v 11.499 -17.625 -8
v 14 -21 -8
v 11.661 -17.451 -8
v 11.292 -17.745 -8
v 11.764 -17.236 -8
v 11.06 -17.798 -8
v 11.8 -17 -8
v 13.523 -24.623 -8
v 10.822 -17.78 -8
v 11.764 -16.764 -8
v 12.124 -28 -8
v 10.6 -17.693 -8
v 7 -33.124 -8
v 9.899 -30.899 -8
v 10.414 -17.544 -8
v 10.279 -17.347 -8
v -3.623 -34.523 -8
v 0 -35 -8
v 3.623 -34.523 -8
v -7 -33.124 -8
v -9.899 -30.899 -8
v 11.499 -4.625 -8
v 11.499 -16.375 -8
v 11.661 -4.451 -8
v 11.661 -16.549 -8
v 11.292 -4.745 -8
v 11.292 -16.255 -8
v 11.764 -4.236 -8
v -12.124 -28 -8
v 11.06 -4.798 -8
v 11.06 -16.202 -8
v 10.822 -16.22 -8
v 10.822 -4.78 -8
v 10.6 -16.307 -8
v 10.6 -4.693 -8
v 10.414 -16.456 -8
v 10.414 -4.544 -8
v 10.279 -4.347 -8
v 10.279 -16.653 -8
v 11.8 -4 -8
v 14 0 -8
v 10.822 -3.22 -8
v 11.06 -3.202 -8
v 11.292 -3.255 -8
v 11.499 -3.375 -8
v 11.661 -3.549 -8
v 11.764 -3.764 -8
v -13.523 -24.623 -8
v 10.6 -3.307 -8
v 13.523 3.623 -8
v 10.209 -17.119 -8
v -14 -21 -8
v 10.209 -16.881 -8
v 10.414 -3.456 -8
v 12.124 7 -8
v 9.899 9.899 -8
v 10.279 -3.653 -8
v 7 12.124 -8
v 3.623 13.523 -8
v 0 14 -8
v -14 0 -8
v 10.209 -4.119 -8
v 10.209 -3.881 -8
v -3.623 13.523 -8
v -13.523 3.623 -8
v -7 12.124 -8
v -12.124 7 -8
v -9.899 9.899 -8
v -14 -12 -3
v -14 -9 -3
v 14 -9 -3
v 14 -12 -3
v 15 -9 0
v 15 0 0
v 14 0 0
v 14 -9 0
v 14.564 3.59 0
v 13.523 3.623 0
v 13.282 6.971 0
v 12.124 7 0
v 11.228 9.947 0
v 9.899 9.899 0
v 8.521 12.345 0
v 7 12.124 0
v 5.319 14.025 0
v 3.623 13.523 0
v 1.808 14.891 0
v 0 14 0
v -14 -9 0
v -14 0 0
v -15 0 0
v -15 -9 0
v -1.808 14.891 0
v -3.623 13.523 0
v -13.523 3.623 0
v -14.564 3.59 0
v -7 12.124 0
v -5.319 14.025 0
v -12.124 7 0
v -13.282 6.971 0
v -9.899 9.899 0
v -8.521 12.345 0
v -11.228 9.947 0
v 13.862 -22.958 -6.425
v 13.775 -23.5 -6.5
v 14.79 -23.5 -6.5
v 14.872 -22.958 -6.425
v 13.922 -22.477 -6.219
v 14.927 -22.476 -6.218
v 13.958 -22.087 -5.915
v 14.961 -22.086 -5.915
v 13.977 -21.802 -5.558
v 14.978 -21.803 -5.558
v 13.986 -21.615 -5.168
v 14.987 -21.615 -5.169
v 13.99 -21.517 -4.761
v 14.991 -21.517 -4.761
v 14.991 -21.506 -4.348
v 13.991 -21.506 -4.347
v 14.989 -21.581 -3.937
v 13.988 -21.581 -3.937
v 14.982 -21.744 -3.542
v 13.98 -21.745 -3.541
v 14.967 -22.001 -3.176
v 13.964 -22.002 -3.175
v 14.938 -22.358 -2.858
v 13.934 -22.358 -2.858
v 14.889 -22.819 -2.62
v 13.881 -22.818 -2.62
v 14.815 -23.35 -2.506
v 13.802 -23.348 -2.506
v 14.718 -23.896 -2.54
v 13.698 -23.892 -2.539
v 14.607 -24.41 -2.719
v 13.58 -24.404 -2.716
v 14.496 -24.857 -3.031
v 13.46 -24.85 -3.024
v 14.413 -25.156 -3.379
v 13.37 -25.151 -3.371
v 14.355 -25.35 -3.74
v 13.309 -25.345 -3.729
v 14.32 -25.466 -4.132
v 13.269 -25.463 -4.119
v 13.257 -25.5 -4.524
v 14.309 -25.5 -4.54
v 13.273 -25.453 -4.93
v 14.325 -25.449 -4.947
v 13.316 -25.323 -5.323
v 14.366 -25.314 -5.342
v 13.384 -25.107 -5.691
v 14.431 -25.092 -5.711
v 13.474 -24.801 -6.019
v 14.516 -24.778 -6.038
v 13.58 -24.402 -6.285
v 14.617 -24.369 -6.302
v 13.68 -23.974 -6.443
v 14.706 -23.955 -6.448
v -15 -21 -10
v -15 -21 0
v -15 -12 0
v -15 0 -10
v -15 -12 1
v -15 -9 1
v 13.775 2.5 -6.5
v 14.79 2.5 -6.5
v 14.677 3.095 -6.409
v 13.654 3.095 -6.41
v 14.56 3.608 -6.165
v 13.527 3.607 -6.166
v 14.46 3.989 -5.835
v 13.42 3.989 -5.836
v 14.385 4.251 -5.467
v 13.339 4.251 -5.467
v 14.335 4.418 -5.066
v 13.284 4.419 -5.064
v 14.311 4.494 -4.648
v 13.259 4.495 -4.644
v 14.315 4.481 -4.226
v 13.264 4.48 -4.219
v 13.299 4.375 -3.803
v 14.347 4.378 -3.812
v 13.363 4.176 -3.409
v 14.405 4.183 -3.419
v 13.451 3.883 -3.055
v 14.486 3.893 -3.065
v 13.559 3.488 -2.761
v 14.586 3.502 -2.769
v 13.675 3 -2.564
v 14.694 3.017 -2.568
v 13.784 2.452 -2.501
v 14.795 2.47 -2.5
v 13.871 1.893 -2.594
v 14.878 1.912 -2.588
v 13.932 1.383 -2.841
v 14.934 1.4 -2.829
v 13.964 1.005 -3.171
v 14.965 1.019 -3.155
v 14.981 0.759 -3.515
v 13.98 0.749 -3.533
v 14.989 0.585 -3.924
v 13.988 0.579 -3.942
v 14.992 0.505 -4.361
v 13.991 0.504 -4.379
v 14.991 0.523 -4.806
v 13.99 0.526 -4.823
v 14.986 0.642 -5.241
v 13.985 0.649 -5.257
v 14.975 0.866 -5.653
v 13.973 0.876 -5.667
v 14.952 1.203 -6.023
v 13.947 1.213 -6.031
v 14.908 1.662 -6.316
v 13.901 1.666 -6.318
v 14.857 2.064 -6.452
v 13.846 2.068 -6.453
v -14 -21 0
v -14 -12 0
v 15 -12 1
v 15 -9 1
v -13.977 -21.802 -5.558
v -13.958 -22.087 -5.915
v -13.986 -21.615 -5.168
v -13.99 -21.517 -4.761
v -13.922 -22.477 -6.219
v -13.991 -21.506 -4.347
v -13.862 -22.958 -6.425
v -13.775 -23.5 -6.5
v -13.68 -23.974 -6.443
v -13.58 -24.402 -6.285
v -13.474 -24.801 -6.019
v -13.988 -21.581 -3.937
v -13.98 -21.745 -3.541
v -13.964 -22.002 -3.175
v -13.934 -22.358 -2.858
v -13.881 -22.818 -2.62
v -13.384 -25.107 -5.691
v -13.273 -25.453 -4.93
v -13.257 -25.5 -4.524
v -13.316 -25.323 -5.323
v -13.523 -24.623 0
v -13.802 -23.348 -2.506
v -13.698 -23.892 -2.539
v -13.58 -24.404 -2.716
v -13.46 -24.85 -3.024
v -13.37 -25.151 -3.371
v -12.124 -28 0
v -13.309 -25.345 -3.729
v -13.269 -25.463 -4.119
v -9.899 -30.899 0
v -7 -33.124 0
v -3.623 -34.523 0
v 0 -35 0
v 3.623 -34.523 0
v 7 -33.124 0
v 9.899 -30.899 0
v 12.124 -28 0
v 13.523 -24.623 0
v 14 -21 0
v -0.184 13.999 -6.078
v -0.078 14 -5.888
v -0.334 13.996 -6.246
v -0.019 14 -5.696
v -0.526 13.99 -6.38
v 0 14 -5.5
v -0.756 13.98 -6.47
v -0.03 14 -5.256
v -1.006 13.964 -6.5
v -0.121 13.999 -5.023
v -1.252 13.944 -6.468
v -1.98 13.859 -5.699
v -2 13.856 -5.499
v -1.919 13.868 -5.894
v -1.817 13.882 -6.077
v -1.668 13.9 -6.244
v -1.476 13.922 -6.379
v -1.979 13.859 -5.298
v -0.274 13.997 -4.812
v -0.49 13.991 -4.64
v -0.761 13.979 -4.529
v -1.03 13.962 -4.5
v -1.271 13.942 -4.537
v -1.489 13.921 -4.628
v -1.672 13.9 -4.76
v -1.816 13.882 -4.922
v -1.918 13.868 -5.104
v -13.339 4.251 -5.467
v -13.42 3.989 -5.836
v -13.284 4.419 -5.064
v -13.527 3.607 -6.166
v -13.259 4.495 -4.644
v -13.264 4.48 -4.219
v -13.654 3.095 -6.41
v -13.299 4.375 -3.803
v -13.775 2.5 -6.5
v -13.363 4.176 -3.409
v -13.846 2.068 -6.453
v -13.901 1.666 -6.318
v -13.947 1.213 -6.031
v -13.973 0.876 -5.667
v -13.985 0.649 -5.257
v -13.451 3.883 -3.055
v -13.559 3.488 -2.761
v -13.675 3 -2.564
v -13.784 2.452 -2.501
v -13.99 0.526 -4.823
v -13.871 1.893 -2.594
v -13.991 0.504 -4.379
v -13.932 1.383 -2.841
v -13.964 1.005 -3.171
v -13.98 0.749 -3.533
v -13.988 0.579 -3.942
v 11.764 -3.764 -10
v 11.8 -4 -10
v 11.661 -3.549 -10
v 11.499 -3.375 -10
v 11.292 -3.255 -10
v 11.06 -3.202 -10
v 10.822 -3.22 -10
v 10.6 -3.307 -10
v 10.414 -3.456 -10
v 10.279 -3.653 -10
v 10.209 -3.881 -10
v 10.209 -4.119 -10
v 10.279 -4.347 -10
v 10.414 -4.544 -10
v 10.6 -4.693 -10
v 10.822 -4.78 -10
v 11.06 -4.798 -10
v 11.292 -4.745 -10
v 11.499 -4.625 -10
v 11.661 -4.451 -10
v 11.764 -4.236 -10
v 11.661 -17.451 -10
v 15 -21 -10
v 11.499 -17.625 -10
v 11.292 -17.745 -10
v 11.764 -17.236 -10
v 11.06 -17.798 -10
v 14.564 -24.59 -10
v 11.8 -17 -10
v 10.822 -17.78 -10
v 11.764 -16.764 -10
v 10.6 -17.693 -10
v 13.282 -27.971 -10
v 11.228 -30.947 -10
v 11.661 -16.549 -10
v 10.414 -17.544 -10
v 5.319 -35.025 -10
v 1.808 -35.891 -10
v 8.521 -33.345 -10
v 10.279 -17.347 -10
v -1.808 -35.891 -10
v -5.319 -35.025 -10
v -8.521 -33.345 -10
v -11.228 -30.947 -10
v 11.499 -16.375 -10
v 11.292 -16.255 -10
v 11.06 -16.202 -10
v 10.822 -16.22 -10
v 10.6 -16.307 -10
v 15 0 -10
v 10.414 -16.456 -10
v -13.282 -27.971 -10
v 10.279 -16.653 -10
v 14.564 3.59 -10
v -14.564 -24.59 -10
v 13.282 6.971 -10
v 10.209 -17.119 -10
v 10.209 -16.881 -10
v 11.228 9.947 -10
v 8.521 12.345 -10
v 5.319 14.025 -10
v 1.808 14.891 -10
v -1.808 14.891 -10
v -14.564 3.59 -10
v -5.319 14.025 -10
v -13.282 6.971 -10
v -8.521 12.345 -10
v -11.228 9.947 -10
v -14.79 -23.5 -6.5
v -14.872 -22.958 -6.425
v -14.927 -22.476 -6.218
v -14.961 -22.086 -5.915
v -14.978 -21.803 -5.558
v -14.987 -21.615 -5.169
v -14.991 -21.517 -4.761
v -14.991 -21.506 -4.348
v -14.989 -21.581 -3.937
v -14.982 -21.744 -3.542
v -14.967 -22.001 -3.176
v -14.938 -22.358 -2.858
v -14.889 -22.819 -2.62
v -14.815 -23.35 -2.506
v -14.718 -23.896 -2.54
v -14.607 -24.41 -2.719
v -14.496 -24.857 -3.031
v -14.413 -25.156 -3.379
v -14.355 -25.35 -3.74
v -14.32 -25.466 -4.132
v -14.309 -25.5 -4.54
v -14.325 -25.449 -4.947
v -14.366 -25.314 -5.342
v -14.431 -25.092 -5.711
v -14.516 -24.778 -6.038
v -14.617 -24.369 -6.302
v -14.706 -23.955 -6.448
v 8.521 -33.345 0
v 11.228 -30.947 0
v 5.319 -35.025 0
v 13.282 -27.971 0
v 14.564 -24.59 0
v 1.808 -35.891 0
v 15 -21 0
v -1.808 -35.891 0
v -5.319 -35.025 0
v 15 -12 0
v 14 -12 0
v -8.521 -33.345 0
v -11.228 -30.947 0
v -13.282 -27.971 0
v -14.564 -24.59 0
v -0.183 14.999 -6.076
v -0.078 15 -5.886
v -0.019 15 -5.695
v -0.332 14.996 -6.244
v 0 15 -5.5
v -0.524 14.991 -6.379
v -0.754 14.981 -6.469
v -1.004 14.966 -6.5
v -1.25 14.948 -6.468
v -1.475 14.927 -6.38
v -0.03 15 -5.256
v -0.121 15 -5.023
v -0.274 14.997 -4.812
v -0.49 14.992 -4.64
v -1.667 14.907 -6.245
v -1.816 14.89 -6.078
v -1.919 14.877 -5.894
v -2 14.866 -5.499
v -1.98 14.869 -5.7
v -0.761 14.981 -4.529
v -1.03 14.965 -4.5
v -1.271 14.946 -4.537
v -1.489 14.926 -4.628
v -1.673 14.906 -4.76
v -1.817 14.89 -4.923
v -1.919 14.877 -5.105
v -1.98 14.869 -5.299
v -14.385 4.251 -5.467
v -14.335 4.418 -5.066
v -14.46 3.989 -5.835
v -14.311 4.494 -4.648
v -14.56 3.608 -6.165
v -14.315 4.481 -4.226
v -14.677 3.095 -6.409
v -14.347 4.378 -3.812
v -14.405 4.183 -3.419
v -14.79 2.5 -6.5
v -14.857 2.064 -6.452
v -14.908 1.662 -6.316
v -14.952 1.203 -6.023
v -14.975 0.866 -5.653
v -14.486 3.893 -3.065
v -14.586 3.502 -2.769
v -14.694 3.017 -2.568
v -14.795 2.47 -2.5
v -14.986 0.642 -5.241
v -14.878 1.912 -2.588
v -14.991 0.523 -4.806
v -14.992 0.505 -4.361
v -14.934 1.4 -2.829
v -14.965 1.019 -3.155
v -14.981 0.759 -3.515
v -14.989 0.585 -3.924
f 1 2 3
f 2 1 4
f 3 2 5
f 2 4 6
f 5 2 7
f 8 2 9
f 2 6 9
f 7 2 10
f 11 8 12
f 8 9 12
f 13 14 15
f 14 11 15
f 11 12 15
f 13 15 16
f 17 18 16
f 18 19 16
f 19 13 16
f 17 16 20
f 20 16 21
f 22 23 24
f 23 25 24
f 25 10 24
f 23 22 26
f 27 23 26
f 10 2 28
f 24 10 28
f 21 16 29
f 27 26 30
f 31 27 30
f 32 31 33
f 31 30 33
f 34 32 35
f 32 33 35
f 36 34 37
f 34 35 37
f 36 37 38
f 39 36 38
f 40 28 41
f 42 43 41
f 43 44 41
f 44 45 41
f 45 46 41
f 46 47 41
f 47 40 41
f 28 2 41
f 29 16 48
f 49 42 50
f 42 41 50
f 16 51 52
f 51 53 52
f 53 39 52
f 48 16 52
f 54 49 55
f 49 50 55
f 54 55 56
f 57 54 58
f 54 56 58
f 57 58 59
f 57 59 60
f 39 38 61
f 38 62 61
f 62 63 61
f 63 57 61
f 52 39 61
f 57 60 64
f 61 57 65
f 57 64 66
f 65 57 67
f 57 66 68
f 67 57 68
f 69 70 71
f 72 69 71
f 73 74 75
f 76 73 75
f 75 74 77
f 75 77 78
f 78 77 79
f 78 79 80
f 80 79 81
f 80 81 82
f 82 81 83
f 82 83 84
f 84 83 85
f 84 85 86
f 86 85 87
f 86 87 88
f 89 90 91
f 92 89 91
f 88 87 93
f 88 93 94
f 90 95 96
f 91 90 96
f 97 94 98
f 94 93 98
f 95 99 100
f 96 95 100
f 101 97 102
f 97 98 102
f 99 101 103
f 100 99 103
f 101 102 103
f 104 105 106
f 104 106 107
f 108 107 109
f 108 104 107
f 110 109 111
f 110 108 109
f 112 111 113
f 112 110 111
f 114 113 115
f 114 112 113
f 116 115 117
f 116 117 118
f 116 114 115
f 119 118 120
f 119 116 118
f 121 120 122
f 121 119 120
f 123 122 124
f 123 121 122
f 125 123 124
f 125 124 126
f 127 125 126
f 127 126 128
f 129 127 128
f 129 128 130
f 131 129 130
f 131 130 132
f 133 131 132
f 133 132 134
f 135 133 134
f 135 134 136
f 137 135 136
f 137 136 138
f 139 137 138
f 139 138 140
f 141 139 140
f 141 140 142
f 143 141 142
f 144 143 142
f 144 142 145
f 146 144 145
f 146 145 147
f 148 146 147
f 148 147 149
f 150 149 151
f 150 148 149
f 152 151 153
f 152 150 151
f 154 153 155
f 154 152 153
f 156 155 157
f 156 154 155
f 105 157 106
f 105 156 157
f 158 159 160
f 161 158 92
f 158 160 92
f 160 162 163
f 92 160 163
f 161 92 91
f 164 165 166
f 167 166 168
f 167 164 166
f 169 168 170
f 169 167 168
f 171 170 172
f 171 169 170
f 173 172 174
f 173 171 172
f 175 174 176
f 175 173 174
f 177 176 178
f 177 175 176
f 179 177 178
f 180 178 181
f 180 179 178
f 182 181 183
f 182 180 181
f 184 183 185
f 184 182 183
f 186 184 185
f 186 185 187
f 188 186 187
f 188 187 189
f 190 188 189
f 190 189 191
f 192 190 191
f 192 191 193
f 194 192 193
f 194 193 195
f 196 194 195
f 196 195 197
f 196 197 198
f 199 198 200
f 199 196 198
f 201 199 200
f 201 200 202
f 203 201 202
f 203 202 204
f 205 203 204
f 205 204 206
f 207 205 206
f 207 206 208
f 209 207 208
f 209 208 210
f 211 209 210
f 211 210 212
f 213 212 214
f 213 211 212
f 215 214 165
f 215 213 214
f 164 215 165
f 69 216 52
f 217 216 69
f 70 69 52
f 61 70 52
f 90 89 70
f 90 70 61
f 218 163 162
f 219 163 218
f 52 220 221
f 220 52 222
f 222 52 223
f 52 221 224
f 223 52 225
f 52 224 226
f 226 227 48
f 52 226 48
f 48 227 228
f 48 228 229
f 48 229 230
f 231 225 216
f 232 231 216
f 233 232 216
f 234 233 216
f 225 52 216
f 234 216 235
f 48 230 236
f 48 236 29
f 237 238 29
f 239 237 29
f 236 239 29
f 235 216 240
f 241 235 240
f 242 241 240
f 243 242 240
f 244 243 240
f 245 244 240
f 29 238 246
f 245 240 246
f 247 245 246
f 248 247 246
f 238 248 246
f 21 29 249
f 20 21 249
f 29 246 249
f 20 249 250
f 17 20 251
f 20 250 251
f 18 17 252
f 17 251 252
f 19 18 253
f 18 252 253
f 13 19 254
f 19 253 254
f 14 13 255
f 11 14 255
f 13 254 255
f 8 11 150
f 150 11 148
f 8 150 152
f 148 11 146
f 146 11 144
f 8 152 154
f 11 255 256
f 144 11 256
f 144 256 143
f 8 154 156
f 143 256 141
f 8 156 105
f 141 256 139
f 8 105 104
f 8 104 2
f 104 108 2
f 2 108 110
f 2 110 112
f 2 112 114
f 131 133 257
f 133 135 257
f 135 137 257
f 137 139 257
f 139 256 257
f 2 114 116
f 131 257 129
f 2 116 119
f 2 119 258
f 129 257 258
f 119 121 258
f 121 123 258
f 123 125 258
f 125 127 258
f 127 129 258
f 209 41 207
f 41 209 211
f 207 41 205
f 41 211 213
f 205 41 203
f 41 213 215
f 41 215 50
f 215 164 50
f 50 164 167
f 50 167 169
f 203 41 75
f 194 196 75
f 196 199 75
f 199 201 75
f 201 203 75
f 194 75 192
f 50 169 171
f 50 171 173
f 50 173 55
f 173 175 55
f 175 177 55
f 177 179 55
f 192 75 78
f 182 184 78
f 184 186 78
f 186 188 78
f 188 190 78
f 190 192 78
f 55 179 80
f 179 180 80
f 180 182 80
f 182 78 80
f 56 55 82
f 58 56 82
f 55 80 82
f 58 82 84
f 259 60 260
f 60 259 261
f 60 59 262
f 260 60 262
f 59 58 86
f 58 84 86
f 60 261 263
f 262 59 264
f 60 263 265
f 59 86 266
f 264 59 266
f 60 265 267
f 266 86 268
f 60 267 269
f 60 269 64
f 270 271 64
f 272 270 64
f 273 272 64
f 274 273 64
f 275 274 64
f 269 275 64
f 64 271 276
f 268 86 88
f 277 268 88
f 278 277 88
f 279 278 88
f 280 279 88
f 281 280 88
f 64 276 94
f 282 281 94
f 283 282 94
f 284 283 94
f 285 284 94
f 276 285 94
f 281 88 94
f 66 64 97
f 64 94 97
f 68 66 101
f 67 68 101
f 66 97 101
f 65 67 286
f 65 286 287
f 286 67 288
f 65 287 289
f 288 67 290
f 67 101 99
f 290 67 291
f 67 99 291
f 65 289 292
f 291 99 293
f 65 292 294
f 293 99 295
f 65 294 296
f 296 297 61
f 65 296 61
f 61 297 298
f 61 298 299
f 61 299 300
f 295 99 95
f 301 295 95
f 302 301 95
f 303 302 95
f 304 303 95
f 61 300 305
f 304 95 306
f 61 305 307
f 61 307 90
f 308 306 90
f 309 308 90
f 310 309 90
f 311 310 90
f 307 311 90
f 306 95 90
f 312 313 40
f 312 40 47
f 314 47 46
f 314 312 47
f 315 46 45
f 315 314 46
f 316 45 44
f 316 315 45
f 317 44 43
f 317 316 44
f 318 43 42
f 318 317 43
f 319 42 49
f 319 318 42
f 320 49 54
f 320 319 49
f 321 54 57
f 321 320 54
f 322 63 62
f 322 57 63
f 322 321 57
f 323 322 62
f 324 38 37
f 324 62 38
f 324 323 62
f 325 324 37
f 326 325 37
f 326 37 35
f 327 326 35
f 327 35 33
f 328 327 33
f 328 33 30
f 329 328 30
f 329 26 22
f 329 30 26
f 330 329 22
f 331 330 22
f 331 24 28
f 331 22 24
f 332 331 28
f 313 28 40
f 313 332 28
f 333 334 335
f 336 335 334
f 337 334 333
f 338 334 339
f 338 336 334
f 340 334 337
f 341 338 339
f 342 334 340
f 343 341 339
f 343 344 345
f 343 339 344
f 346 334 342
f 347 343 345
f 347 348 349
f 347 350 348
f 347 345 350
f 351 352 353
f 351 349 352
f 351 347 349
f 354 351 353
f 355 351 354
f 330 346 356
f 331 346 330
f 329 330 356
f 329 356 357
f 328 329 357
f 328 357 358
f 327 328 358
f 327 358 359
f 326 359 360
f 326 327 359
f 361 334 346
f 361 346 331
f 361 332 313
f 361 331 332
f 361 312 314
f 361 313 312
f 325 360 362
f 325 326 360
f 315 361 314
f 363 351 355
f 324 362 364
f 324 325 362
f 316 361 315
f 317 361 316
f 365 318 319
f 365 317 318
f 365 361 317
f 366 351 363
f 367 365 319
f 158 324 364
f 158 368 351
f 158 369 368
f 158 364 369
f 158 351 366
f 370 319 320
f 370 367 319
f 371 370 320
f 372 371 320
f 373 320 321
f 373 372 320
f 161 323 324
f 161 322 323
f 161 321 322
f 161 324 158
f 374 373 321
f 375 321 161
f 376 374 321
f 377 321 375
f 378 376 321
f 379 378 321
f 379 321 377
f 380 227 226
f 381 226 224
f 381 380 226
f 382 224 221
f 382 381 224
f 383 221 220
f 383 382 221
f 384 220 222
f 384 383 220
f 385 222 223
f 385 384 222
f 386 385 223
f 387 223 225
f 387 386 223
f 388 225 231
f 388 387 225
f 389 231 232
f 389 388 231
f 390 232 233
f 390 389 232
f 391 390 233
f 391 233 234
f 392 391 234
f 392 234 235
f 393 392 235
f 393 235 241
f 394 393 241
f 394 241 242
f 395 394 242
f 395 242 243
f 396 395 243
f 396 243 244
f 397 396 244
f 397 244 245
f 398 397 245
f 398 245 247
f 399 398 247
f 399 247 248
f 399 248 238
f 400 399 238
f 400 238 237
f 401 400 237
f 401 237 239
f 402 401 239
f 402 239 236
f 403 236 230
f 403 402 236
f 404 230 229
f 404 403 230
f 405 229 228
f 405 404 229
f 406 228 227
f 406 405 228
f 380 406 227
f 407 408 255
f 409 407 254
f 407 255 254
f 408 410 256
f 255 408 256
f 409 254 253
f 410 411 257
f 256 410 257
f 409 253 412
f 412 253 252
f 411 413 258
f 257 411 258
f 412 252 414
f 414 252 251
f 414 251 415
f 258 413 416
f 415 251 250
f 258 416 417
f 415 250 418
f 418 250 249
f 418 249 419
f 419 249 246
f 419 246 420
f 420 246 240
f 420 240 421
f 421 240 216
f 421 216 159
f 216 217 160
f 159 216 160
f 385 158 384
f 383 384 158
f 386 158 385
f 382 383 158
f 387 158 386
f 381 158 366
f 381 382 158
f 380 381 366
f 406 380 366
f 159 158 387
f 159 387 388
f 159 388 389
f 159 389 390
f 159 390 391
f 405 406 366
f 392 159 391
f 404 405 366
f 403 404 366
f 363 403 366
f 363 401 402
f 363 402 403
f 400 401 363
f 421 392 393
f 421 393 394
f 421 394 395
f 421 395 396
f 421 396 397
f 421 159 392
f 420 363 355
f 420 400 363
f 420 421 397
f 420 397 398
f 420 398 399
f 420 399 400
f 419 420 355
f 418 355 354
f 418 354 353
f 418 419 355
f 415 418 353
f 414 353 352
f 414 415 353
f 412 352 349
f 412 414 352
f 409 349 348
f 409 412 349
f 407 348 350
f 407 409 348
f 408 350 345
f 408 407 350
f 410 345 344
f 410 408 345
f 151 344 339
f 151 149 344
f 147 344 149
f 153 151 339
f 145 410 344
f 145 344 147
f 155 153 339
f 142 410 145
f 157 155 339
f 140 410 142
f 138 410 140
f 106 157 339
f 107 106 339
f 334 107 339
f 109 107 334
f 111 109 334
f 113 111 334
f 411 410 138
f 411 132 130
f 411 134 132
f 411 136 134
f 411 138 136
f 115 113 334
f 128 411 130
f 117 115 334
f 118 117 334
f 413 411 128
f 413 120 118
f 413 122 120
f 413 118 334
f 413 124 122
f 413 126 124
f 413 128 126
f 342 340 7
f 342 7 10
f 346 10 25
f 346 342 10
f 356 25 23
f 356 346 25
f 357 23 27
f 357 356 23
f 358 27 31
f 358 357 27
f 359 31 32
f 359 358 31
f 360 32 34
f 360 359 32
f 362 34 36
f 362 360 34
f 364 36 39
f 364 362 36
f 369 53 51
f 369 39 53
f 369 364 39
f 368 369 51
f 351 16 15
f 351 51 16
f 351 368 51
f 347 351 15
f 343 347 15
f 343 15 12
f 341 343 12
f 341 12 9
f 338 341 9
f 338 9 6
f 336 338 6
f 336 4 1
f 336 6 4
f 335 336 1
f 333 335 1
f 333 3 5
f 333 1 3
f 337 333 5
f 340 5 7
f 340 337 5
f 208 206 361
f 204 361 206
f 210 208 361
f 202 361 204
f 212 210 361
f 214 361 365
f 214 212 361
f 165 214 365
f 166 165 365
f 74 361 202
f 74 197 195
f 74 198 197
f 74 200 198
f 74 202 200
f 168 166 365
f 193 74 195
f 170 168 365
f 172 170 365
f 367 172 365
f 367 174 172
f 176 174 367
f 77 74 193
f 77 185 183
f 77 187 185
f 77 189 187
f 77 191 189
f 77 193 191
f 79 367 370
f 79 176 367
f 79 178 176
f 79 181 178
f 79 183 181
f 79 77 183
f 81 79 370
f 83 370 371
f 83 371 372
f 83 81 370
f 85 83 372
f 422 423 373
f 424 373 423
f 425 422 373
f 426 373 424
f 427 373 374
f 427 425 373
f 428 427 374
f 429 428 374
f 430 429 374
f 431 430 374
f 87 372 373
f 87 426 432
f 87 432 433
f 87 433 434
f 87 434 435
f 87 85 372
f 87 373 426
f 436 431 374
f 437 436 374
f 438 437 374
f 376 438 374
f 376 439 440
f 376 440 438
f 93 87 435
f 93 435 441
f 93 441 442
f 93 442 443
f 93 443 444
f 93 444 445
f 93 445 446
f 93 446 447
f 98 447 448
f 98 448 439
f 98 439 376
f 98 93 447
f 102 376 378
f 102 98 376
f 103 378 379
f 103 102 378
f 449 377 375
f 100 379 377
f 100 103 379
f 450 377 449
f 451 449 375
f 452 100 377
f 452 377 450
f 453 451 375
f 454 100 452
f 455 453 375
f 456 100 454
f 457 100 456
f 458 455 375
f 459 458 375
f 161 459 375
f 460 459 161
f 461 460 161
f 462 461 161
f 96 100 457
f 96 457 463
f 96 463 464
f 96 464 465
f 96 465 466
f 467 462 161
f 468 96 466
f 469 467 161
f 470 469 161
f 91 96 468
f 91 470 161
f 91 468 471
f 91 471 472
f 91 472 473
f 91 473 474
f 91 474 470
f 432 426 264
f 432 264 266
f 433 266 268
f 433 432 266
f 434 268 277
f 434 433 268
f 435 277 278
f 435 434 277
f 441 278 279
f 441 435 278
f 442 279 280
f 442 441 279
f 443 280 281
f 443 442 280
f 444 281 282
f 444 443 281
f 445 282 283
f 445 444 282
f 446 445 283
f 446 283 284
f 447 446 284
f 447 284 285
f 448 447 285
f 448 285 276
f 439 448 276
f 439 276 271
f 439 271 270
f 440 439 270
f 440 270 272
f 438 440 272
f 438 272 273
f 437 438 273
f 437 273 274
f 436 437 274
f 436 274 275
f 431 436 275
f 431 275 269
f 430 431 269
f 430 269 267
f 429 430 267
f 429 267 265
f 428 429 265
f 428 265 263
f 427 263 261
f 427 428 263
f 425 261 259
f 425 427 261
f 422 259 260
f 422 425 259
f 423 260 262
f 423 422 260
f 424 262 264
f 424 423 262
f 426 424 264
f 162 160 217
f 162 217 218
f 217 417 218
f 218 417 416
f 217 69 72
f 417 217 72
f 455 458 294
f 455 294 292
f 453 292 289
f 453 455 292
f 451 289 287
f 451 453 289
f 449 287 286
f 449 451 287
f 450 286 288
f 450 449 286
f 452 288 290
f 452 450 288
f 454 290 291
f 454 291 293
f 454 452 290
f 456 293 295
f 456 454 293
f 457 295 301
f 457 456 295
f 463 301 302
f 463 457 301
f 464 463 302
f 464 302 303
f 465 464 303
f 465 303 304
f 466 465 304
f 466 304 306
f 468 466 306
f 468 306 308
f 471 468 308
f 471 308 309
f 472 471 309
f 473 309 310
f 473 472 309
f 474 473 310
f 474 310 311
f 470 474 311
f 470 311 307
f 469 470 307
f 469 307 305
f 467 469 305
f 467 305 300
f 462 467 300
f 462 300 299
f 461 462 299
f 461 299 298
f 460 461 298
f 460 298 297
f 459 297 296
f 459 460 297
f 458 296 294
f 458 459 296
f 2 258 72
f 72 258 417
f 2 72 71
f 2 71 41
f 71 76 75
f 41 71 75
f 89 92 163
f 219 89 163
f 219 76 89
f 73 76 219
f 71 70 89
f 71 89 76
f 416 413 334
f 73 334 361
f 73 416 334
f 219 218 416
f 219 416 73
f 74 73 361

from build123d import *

# Parameters (mm, degrees)
CYLINDER049_R           = 0.8
CYLINDER049_DEPTH       = 10
CYLINDER048_R           = 0.8
CYLINDER048_DEPTH       = 10
CYLINDER017_R           = 1
CYLINDER017_DEPTH       = 10
CYLINDER017_ROLL_ANGLE  = 90
CYLINDER011_R           = 2
CYLINDER011_DEPTH       = 10
CYLINDER011_PITCH_ANGLE = 90
CYLINDER014_R           = 2
CYLINDER014_DEPTH       = 10
CYLINDER014_PITCH_ANGLE = 90
CYLINDER013_R           = 2
CYLINDER013_DEPTH       = 10
CYLINDER013_PITCH_ANGLE = 90
CYLINDER015_R           = 2
CYLINDER015_DEPTH       = 10
CYLINDER015_PITCH_ANGLE = 90
CYLINDER002_W           = 14
CYLINDER002_H           = 8
CYLINDER002_ANGLE       = 180
CYLINDER001_W           = 15
CYLINDER001_H           = 10
CYLINDER001_ANGLE       = 180
CYLINDER003_W           = 14
CYLINDER003_H           = 8
CYLINDER003_ANGLE       = 180
CYLINDER_W              = 15
CYLINDER_H              = 10
CYLINDER_ANGLE          = 180
BOX001_W                = 28
BOX001_H                = 21
BOX001_DEPTH            = 8
BOX_W                   = 30
BOX_H                   = 21
BOX_DEPTH               = 10
FUSION_PLACEMENT_ANGLE  = 180
BOX014_W                = 28
BOX014_H                = 3
BOX014_DEPTH            = 3
BOX007_W                = 30
BOX007_H                = 3
BOX007_DEPTH            = 1


with BuildPart() as cilindro049:
    # Cylinder049 → Cylinder049 (new body)
    with BuildSketch(Plane(origin=(11, -17, -15), x_dir=(1, 0, 0), z_dir=(0, 0, 1))):
        Circle(CYLINDER049_R)
    extrude(amount=CYLINDER049_DEPTH)


with BuildPart() as cilindro048:
    # Cylinder048 → Cylinder048 (new body)
    with BuildSketch(Plane(origin=(11, -4, -15), x_dir=(1, 0, 0), z_dir=(0, 0, 1))):
        Circle(CYLINDER048_R)
    extrude(amount=CYLINDER048_DEPTH)


with BuildPart() as cilindro017:
    # Cylinder017 → Cylinder017 (new body)
    with BuildSketch(Plane.XY):
        Circle(CYLINDER017_R)
    extrude(amount=CYLINDER017_DEPTH)


with BuildPart() as cilindro017_1:
    # Cylinder017 roll: moved
    add(cilindro017.part.rotate(Axis((0, 0, 0), (1, 0, 0)), CYLINDER017_ROLL_ANGLE))


with BuildPart() as cilindro017_2:
    # Cylinder017 placement: moved
    add(cilindro017_1.part.moved(Location((-14, 90, 38.5))))


with BuildPart() as cilindro011:
    # Cylinder011 → Cylinder011 (new body)
    with BuildSketch(Plane.XY):
        Circle(CYLINDER011_R)
    extrude(amount=CYLINDER011_DEPTH)


with BuildPart() as cilindro011_1:
    # Cylinder011 pitch: moved
    add(cilindro011.part.rotate(Axis((0, 0, 0), (0, 1, 0)), CYLINDER011_PITCH_ANGLE))


with BuildPart() as cilindro011_2:
    # Cylinder011 placement: moved
    add(cilindro011_1.part.moved(Location((-32, 72.5, 39.5))))


with BuildPart() as cilindro014:
    # Cylinder014 → Cylinder014 (new body)
    with BuildSketch(Plane.XY):
        Circle(CYLINDER014_R)
    extrude(amount=CYLINDER014_DEPTH)


with BuildPart() as cilindro014_1:
    # Cylinder014 pitch: moved
    add(cilindro014.part.rotate(Axis((0, 0, 0), (0, 1, 0)), CYLINDER014_PITCH_ANGLE))


with BuildPart() as cilindro014_2:
    # Cylinder014 placement: moved
    add(cilindro014_1.part.moved(Location((-5, 46.5, 39.5))))


with BuildPart() as cilindro013:
    # Cylinder013 → Cylinder013 (new body)
    with BuildSketch(Plane.XY):
        Circle(CYLINDER013_R)
    extrude(amount=CYLINDER013_DEPTH)


with BuildPart() as cilindro013_1:
    # Cylinder013 pitch: moved
    add(cilindro013.part.rotate(Axis((0, 0, 0), (0, 1, 0)), CYLINDER013_PITCH_ANGLE))


with BuildPart() as cilindro013_2:
    # Cylinder013 placement: moved
    add(cilindro013_1.part.moved(Location((-32, 46.5, 39.5))))


with BuildPart() as cilindro015:
    # Cylinder015 → Cylinder015 (new body)
    with BuildSketch(Plane.XY):
        Circle(CYLINDER015_R)
    extrude(amount=CYLINDER015_DEPTH)


with BuildPart() as cilindro015_1:
    # Cylinder015 pitch: moved
    add(cilindro015.part.rotate(Axis((0, 0, 0), (0, 1, 0)), CYLINDER015_PITCH_ANGLE))


with BuildPart() as cilindro015_2:
    # Cylinder015 placement: moved
    add(cilindro015_1.part.moved(Location((-5, 72.5, 39.5))))


with BuildPart() as cilindro002:
    # Cylinder002 → Cylinder002 (revolve)
    with BuildSketch(Plane(origin=(16, 49, -36), x_dir=(1, 0, 0), z_dir=(0, 1, 0))):
        with Locations((7, 4)):
            Rectangle(CYLINDER002_W, CYLINDER002_H)
    revolve(axis=Axis((16, 49, -36), (0, 0, -1)), revolution_arc=CYLINDER002_ANGLE)


with BuildPart() as cut001:
    # Cylinder001 → Cylinder001 (revolve)
    with BuildSketch(Plane(origin=(16, 49, -34), x_dir=(1, 0, 0), z_dir=(0, 1, 0))):
        with Locations((7.5, 5)):
            Rectangle(CYLINDER001_W, CYLINDER001_H)
    revolve(axis=Axis((16, 49, -34), (0, 0, -1)), revolution_arc=CYLINDER001_ANGLE)

    # Cut001: cut Cilindro002
    add(cilindro002.part, mode=Mode.SUBTRACT)


with BuildPart() as cut001_1:
    # Cut001 placement: moved
    add(cut001.part.moved(Location((-3, 0, 0))))


with BuildPart() as cilindro003:
    # Cylinder003 → Cylinder003 (revolve)
    with BuildSketch(Plane(origin=(13, 70, -36), x_dir=(-1, 0, 0), z_dir=(0, -1, 0))):
        with Locations((7, 4)):
            Rectangle(CYLINDER003_W, CYLINDER003_H)
    revolve(axis=Axis((13, 70, -36), (0, 0, -1)), revolution_arc=CYLINDER003_ANGLE)


with BuildPart() as cut002:
    # Cylinder → Cylinder (revolve)
    with BuildSketch(Plane(origin=(13, 70, -34), x_dir=(-1, 0, 0), z_dir=(0, -1, 0))):
        with Locations((7.5, 5)):
            Rectangle(CYLINDER_W, CYLINDER_H)
    revolve(axis=Axis((13, 70, -34), (0, 0, -1)), revolution_arc=CYLINDER_ANGLE)

    # Cut002: cut Cilindro003
    add(cilindro003.part, mode=Mode.SUBTRACT)


with BuildPart() as cubo001:
    # Box001 → Box001 (new body)
    with BuildSketch(Plane(origin=(-1, 49, -44), x_dir=(1, 0, 0), z_dir=(0, 0, 1))):
        with Locations((14, 10.5)):
            Rectangle(BOX001_W, BOX001_H)
    extrude(amount=BOX001_DEPTH)


with BuildPart() as cut025:
    # Box → Box (new body)
    with BuildSketch(Plane(origin=(-2, 49, -44), x_dir=(1, 0, 0), z_dir=(0, 0, 1))):
        with Locations((15, 10.5)):
            Rectangle(BOX_W, BOX_H)
    extrude(amount=BOX_DEPTH)

    # Cut: cut Cubo001
    add(cubo001.part, mode=Mode.SUBTRACT)

    # Fusion: union Cut001, Cut002
    add(cut001_1.part)
    add(cut002.part)


with BuildPart() as cut025_1:
    # Fusion placement: moved
    add(cut025.part.rotate(Axis((0, 0, 0), (0, 1, 0)), FUSION_PLACEMENT_ANGLE))

    # Cut021: cut Cilindro015
    add(cilindro015_2.part, mode=Mode.SUBTRACT)

    # Cut022: cut Cilindro013
    add(cilindro013_2.part, mode=Mode.SUBTRACT)

    # Cut023: cut Cilindro014
    add(cilindro014_2.part, mode=Mode.SUBTRACT)

    # Cut024: cut Cilindro011
    add(cilindro011_2.part, mode=Mode.SUBTRACT)

    # Cut025: cut Cilindro017
    add(cilindro017_2.part, mode=Mode.SUBTRACT)


with BuildPart() as cubo014:
    # Box014 → Box014 (new body)
    with BuildSketch(Plane(origin=(-27, 58, 41), x_dir=(1, 0, 0), z_dir=(0, 0, 1))):
        with Locations((14, 1.5)):
            Rectangle(BOX014_W, BOX014_H)
    extrude(amount=BOX014_DEPTH)


with BuildPart() as cut068:
    # Box007 → Box007 (new body)
    with BuildSketch(Plane(origin=(-28, 58, 44), x_dir=(1, 0, 0), z_dir=(0, 0, 1))):
        with Locations((15, 1.5)):
            Rectangle(BOX007_W, BOX007_H)
    extrude(amount=BOX007_DEPTH)

    # Fusion002010: union Cubo014
    add(cubo014.part)

    # Fusion002015: union Cut025
    add(cut025_1.part)


with BuildPart() as cut068_1:
    # Fusion002015 placement: moved
    add(cut068.part.moved(Location((13, -70, -44))))

    # Cut067: cut Cilindro048
    add(cilindro048.part, mode=Mode.SUBTRACT)

    # Cut068: cut Cilindro049
    add(cilindro049.part, mode=Mode.SUBTRACT)


solid = cut068_1.part
